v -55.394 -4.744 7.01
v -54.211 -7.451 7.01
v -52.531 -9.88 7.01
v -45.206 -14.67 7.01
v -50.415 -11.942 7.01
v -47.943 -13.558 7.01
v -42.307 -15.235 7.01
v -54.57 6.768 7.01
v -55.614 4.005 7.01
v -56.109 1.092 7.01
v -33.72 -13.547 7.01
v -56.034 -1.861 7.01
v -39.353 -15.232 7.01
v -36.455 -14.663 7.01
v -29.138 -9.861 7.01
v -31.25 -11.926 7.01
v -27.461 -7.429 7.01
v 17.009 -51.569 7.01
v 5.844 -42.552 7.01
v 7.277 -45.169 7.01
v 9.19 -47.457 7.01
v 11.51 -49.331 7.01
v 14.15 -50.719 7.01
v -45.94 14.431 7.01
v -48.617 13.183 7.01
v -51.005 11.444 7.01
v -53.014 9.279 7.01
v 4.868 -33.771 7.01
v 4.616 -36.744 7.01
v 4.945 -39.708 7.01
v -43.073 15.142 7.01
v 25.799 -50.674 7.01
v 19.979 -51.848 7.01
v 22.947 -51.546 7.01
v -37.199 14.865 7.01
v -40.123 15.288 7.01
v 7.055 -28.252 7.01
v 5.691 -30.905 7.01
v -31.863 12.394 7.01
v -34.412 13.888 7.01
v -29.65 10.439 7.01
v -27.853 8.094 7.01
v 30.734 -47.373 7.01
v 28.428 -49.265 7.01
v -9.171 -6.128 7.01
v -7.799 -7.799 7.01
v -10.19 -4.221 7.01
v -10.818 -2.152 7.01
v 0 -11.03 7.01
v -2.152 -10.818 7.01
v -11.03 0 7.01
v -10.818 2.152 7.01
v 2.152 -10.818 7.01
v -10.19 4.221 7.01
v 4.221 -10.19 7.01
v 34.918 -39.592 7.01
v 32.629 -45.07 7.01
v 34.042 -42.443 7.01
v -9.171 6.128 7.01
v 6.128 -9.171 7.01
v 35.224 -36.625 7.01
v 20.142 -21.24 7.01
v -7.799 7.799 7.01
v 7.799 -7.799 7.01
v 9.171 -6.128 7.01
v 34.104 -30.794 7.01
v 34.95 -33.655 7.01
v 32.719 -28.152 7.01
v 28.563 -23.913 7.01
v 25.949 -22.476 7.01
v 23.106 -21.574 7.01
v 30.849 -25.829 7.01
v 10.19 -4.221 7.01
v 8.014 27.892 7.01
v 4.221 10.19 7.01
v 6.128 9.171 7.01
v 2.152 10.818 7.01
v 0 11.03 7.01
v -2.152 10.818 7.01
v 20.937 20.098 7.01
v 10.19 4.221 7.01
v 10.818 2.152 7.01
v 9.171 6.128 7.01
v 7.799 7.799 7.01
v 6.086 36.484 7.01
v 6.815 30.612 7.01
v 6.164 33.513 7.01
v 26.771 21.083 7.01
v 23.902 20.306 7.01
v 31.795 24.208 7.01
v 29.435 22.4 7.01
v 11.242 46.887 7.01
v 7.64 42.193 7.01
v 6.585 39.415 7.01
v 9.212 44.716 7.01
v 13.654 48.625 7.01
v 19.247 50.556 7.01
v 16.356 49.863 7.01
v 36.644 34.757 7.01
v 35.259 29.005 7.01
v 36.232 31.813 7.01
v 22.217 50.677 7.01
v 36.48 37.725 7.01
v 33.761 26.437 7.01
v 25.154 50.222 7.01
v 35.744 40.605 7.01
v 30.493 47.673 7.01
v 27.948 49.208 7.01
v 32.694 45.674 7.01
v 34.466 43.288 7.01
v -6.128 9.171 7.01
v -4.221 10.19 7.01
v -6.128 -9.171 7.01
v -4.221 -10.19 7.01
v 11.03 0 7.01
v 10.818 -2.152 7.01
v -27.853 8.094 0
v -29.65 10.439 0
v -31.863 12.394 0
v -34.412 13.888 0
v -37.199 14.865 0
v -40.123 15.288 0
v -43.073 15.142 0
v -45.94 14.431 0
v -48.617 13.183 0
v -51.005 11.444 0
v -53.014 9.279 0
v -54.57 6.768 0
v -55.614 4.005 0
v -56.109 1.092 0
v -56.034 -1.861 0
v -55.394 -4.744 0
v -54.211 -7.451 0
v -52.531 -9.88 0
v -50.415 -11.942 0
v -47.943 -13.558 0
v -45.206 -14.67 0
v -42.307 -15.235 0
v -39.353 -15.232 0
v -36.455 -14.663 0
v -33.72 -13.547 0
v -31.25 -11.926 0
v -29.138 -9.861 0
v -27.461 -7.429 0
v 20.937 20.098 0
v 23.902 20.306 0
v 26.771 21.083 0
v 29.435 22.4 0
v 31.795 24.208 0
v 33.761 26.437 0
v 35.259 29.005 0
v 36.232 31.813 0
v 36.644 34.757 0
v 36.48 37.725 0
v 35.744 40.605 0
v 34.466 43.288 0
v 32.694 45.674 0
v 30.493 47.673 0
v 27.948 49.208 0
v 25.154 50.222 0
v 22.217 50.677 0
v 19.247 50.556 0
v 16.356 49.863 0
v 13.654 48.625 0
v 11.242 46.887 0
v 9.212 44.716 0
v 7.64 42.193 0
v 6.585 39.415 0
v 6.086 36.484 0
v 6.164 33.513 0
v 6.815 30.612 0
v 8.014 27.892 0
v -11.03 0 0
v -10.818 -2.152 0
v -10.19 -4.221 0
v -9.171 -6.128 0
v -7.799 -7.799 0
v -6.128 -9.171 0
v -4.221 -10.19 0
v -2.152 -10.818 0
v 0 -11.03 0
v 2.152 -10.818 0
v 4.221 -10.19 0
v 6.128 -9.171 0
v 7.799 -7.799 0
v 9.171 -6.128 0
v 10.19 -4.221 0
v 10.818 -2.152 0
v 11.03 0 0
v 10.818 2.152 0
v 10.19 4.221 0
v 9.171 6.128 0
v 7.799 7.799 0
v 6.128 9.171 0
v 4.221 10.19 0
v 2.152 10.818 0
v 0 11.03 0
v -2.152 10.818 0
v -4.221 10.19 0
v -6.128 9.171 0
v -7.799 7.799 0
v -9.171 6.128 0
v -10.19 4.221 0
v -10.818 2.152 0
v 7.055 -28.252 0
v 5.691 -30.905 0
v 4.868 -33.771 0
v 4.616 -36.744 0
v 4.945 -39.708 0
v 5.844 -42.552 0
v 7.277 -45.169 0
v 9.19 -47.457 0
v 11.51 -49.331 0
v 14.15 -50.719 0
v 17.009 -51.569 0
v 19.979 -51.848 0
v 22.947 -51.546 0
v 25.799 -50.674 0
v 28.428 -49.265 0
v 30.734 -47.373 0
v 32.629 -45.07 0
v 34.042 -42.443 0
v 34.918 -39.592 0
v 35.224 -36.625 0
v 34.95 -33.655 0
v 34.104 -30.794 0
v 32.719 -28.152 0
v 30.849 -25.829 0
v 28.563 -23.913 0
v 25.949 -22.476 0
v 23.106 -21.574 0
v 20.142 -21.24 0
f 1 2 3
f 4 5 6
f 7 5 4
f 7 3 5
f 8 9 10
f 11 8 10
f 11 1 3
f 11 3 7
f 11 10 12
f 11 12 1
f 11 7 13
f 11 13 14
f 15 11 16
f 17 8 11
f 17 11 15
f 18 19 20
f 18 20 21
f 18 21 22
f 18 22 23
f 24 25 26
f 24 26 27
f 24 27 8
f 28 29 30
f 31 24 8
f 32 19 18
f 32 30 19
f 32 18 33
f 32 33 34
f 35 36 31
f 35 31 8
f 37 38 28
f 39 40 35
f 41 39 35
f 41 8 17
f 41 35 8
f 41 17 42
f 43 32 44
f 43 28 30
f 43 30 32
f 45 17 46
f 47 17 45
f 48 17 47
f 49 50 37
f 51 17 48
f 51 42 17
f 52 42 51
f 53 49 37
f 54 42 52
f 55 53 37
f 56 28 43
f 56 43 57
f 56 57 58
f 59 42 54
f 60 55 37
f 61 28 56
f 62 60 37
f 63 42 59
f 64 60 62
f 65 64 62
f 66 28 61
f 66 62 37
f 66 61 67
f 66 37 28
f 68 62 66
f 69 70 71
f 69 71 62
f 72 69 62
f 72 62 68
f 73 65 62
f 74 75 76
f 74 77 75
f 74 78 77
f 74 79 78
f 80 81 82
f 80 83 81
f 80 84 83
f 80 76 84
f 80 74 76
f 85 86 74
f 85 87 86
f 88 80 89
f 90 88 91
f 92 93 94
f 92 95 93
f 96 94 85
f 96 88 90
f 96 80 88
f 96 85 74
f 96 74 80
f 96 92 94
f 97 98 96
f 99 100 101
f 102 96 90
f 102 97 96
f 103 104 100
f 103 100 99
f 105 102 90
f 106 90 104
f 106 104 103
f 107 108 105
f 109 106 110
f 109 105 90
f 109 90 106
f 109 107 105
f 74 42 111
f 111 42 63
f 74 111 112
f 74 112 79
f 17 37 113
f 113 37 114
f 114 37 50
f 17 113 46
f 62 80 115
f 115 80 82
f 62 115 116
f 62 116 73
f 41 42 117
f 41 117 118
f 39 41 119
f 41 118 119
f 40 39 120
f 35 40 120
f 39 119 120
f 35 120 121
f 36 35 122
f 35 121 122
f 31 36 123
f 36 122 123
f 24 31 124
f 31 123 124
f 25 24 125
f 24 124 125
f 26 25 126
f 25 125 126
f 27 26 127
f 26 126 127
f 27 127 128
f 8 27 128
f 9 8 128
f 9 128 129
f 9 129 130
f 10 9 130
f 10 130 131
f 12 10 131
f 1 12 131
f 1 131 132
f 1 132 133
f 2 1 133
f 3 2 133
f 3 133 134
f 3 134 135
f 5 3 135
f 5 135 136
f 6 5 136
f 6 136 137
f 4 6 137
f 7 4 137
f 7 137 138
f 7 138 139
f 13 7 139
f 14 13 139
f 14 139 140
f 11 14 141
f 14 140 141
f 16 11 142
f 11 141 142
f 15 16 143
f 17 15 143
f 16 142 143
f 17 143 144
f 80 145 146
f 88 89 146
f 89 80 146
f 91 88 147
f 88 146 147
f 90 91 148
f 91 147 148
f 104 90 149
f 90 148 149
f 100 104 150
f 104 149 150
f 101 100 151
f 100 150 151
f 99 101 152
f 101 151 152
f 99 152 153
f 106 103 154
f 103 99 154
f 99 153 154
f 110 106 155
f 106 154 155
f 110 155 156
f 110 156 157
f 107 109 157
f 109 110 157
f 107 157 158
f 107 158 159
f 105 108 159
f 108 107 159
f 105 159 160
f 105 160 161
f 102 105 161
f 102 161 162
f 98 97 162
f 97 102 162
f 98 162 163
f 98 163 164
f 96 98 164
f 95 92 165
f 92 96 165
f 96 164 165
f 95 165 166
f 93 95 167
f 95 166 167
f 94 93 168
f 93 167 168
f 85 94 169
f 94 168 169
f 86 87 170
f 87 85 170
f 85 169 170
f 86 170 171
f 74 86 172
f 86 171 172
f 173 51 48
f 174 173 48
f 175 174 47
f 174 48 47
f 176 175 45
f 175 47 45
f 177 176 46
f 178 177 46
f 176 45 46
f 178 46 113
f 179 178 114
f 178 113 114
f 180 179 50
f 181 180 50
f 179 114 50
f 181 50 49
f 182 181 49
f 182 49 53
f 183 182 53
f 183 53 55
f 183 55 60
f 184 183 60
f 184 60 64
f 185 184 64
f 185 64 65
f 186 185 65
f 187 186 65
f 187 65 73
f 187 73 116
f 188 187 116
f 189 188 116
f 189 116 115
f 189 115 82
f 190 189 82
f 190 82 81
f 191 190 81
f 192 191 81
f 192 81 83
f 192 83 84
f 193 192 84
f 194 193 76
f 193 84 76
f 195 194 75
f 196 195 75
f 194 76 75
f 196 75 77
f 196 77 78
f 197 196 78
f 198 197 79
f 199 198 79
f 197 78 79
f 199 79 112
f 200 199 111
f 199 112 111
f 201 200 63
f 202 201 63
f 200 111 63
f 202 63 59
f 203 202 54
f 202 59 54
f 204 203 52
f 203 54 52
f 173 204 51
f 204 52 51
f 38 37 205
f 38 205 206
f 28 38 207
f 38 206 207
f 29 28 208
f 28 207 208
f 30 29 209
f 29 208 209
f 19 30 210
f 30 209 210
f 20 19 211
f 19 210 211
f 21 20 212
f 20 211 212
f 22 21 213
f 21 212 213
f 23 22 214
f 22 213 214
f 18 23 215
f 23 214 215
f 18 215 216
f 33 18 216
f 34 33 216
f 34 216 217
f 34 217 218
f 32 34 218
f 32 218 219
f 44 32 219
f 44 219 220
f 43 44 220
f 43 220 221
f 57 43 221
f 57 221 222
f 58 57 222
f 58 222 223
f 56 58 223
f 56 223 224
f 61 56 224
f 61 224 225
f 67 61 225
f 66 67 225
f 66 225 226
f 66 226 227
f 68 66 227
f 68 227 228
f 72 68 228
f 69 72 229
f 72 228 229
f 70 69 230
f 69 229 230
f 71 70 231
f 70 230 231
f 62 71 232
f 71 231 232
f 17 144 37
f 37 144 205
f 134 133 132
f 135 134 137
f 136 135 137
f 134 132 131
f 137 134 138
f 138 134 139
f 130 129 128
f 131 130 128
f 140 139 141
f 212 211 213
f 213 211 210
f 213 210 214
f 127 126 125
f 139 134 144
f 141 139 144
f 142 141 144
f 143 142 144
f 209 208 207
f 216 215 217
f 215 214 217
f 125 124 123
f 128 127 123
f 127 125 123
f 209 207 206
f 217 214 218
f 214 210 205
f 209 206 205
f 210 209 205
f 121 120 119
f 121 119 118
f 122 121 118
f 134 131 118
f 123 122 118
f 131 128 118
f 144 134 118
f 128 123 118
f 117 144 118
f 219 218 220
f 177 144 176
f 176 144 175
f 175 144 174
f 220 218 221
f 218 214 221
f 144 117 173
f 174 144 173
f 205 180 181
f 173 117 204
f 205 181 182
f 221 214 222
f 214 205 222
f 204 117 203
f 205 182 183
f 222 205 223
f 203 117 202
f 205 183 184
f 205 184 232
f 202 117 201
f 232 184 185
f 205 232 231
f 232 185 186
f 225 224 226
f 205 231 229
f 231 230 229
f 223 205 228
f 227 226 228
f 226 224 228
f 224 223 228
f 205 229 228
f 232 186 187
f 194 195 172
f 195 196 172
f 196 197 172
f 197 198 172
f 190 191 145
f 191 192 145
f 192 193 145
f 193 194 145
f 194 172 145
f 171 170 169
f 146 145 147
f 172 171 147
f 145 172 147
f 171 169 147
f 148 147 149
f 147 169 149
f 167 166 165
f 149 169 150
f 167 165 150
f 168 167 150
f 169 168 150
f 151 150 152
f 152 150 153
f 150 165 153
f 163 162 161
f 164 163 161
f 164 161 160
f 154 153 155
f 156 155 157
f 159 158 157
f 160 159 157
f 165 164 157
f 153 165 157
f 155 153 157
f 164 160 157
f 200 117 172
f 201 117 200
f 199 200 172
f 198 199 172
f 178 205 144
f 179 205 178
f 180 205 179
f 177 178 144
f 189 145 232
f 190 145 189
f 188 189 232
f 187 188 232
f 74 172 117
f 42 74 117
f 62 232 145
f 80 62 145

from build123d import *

# Parameters (mm, degrees)
F1_DEPTH = 7.0104
F2_D     = 22.06
F3_R     = 15.305
F4_DEPTH = 7.0104


with BuildPart() as f1:
    # F0 (on Top) → F1 (new body)
    with BuildSketch(Plane.XY):
        Polygon((21.226586, 35.185908), (-41.085183, 0.789809), (19.858597, -35.975717), align=None)
    extrude(amount=F1_DEPTH)

    # F2 (through all)
    with Locations(Plane(origin=(0, 0, 0), x_dir=(1, 0, 0), z_dir=(0, 0, -1))):
        with Locations((0, 0)):
            Hole(F2_D / 2)

    # F3 (on Top) → F4 (join)
    with BuildSketch(Plane.XY):
        with Locations((21.35277, 35.396876)):
            Circle(F3_R)
        with Locations((-40.842548, 0)):
            Circle(F3_R)
        with Locations((19.9197, -36.543333)):
            Circle(F3_R)
    extrude(amount=F4_DEPTH)


solid = f1.part
